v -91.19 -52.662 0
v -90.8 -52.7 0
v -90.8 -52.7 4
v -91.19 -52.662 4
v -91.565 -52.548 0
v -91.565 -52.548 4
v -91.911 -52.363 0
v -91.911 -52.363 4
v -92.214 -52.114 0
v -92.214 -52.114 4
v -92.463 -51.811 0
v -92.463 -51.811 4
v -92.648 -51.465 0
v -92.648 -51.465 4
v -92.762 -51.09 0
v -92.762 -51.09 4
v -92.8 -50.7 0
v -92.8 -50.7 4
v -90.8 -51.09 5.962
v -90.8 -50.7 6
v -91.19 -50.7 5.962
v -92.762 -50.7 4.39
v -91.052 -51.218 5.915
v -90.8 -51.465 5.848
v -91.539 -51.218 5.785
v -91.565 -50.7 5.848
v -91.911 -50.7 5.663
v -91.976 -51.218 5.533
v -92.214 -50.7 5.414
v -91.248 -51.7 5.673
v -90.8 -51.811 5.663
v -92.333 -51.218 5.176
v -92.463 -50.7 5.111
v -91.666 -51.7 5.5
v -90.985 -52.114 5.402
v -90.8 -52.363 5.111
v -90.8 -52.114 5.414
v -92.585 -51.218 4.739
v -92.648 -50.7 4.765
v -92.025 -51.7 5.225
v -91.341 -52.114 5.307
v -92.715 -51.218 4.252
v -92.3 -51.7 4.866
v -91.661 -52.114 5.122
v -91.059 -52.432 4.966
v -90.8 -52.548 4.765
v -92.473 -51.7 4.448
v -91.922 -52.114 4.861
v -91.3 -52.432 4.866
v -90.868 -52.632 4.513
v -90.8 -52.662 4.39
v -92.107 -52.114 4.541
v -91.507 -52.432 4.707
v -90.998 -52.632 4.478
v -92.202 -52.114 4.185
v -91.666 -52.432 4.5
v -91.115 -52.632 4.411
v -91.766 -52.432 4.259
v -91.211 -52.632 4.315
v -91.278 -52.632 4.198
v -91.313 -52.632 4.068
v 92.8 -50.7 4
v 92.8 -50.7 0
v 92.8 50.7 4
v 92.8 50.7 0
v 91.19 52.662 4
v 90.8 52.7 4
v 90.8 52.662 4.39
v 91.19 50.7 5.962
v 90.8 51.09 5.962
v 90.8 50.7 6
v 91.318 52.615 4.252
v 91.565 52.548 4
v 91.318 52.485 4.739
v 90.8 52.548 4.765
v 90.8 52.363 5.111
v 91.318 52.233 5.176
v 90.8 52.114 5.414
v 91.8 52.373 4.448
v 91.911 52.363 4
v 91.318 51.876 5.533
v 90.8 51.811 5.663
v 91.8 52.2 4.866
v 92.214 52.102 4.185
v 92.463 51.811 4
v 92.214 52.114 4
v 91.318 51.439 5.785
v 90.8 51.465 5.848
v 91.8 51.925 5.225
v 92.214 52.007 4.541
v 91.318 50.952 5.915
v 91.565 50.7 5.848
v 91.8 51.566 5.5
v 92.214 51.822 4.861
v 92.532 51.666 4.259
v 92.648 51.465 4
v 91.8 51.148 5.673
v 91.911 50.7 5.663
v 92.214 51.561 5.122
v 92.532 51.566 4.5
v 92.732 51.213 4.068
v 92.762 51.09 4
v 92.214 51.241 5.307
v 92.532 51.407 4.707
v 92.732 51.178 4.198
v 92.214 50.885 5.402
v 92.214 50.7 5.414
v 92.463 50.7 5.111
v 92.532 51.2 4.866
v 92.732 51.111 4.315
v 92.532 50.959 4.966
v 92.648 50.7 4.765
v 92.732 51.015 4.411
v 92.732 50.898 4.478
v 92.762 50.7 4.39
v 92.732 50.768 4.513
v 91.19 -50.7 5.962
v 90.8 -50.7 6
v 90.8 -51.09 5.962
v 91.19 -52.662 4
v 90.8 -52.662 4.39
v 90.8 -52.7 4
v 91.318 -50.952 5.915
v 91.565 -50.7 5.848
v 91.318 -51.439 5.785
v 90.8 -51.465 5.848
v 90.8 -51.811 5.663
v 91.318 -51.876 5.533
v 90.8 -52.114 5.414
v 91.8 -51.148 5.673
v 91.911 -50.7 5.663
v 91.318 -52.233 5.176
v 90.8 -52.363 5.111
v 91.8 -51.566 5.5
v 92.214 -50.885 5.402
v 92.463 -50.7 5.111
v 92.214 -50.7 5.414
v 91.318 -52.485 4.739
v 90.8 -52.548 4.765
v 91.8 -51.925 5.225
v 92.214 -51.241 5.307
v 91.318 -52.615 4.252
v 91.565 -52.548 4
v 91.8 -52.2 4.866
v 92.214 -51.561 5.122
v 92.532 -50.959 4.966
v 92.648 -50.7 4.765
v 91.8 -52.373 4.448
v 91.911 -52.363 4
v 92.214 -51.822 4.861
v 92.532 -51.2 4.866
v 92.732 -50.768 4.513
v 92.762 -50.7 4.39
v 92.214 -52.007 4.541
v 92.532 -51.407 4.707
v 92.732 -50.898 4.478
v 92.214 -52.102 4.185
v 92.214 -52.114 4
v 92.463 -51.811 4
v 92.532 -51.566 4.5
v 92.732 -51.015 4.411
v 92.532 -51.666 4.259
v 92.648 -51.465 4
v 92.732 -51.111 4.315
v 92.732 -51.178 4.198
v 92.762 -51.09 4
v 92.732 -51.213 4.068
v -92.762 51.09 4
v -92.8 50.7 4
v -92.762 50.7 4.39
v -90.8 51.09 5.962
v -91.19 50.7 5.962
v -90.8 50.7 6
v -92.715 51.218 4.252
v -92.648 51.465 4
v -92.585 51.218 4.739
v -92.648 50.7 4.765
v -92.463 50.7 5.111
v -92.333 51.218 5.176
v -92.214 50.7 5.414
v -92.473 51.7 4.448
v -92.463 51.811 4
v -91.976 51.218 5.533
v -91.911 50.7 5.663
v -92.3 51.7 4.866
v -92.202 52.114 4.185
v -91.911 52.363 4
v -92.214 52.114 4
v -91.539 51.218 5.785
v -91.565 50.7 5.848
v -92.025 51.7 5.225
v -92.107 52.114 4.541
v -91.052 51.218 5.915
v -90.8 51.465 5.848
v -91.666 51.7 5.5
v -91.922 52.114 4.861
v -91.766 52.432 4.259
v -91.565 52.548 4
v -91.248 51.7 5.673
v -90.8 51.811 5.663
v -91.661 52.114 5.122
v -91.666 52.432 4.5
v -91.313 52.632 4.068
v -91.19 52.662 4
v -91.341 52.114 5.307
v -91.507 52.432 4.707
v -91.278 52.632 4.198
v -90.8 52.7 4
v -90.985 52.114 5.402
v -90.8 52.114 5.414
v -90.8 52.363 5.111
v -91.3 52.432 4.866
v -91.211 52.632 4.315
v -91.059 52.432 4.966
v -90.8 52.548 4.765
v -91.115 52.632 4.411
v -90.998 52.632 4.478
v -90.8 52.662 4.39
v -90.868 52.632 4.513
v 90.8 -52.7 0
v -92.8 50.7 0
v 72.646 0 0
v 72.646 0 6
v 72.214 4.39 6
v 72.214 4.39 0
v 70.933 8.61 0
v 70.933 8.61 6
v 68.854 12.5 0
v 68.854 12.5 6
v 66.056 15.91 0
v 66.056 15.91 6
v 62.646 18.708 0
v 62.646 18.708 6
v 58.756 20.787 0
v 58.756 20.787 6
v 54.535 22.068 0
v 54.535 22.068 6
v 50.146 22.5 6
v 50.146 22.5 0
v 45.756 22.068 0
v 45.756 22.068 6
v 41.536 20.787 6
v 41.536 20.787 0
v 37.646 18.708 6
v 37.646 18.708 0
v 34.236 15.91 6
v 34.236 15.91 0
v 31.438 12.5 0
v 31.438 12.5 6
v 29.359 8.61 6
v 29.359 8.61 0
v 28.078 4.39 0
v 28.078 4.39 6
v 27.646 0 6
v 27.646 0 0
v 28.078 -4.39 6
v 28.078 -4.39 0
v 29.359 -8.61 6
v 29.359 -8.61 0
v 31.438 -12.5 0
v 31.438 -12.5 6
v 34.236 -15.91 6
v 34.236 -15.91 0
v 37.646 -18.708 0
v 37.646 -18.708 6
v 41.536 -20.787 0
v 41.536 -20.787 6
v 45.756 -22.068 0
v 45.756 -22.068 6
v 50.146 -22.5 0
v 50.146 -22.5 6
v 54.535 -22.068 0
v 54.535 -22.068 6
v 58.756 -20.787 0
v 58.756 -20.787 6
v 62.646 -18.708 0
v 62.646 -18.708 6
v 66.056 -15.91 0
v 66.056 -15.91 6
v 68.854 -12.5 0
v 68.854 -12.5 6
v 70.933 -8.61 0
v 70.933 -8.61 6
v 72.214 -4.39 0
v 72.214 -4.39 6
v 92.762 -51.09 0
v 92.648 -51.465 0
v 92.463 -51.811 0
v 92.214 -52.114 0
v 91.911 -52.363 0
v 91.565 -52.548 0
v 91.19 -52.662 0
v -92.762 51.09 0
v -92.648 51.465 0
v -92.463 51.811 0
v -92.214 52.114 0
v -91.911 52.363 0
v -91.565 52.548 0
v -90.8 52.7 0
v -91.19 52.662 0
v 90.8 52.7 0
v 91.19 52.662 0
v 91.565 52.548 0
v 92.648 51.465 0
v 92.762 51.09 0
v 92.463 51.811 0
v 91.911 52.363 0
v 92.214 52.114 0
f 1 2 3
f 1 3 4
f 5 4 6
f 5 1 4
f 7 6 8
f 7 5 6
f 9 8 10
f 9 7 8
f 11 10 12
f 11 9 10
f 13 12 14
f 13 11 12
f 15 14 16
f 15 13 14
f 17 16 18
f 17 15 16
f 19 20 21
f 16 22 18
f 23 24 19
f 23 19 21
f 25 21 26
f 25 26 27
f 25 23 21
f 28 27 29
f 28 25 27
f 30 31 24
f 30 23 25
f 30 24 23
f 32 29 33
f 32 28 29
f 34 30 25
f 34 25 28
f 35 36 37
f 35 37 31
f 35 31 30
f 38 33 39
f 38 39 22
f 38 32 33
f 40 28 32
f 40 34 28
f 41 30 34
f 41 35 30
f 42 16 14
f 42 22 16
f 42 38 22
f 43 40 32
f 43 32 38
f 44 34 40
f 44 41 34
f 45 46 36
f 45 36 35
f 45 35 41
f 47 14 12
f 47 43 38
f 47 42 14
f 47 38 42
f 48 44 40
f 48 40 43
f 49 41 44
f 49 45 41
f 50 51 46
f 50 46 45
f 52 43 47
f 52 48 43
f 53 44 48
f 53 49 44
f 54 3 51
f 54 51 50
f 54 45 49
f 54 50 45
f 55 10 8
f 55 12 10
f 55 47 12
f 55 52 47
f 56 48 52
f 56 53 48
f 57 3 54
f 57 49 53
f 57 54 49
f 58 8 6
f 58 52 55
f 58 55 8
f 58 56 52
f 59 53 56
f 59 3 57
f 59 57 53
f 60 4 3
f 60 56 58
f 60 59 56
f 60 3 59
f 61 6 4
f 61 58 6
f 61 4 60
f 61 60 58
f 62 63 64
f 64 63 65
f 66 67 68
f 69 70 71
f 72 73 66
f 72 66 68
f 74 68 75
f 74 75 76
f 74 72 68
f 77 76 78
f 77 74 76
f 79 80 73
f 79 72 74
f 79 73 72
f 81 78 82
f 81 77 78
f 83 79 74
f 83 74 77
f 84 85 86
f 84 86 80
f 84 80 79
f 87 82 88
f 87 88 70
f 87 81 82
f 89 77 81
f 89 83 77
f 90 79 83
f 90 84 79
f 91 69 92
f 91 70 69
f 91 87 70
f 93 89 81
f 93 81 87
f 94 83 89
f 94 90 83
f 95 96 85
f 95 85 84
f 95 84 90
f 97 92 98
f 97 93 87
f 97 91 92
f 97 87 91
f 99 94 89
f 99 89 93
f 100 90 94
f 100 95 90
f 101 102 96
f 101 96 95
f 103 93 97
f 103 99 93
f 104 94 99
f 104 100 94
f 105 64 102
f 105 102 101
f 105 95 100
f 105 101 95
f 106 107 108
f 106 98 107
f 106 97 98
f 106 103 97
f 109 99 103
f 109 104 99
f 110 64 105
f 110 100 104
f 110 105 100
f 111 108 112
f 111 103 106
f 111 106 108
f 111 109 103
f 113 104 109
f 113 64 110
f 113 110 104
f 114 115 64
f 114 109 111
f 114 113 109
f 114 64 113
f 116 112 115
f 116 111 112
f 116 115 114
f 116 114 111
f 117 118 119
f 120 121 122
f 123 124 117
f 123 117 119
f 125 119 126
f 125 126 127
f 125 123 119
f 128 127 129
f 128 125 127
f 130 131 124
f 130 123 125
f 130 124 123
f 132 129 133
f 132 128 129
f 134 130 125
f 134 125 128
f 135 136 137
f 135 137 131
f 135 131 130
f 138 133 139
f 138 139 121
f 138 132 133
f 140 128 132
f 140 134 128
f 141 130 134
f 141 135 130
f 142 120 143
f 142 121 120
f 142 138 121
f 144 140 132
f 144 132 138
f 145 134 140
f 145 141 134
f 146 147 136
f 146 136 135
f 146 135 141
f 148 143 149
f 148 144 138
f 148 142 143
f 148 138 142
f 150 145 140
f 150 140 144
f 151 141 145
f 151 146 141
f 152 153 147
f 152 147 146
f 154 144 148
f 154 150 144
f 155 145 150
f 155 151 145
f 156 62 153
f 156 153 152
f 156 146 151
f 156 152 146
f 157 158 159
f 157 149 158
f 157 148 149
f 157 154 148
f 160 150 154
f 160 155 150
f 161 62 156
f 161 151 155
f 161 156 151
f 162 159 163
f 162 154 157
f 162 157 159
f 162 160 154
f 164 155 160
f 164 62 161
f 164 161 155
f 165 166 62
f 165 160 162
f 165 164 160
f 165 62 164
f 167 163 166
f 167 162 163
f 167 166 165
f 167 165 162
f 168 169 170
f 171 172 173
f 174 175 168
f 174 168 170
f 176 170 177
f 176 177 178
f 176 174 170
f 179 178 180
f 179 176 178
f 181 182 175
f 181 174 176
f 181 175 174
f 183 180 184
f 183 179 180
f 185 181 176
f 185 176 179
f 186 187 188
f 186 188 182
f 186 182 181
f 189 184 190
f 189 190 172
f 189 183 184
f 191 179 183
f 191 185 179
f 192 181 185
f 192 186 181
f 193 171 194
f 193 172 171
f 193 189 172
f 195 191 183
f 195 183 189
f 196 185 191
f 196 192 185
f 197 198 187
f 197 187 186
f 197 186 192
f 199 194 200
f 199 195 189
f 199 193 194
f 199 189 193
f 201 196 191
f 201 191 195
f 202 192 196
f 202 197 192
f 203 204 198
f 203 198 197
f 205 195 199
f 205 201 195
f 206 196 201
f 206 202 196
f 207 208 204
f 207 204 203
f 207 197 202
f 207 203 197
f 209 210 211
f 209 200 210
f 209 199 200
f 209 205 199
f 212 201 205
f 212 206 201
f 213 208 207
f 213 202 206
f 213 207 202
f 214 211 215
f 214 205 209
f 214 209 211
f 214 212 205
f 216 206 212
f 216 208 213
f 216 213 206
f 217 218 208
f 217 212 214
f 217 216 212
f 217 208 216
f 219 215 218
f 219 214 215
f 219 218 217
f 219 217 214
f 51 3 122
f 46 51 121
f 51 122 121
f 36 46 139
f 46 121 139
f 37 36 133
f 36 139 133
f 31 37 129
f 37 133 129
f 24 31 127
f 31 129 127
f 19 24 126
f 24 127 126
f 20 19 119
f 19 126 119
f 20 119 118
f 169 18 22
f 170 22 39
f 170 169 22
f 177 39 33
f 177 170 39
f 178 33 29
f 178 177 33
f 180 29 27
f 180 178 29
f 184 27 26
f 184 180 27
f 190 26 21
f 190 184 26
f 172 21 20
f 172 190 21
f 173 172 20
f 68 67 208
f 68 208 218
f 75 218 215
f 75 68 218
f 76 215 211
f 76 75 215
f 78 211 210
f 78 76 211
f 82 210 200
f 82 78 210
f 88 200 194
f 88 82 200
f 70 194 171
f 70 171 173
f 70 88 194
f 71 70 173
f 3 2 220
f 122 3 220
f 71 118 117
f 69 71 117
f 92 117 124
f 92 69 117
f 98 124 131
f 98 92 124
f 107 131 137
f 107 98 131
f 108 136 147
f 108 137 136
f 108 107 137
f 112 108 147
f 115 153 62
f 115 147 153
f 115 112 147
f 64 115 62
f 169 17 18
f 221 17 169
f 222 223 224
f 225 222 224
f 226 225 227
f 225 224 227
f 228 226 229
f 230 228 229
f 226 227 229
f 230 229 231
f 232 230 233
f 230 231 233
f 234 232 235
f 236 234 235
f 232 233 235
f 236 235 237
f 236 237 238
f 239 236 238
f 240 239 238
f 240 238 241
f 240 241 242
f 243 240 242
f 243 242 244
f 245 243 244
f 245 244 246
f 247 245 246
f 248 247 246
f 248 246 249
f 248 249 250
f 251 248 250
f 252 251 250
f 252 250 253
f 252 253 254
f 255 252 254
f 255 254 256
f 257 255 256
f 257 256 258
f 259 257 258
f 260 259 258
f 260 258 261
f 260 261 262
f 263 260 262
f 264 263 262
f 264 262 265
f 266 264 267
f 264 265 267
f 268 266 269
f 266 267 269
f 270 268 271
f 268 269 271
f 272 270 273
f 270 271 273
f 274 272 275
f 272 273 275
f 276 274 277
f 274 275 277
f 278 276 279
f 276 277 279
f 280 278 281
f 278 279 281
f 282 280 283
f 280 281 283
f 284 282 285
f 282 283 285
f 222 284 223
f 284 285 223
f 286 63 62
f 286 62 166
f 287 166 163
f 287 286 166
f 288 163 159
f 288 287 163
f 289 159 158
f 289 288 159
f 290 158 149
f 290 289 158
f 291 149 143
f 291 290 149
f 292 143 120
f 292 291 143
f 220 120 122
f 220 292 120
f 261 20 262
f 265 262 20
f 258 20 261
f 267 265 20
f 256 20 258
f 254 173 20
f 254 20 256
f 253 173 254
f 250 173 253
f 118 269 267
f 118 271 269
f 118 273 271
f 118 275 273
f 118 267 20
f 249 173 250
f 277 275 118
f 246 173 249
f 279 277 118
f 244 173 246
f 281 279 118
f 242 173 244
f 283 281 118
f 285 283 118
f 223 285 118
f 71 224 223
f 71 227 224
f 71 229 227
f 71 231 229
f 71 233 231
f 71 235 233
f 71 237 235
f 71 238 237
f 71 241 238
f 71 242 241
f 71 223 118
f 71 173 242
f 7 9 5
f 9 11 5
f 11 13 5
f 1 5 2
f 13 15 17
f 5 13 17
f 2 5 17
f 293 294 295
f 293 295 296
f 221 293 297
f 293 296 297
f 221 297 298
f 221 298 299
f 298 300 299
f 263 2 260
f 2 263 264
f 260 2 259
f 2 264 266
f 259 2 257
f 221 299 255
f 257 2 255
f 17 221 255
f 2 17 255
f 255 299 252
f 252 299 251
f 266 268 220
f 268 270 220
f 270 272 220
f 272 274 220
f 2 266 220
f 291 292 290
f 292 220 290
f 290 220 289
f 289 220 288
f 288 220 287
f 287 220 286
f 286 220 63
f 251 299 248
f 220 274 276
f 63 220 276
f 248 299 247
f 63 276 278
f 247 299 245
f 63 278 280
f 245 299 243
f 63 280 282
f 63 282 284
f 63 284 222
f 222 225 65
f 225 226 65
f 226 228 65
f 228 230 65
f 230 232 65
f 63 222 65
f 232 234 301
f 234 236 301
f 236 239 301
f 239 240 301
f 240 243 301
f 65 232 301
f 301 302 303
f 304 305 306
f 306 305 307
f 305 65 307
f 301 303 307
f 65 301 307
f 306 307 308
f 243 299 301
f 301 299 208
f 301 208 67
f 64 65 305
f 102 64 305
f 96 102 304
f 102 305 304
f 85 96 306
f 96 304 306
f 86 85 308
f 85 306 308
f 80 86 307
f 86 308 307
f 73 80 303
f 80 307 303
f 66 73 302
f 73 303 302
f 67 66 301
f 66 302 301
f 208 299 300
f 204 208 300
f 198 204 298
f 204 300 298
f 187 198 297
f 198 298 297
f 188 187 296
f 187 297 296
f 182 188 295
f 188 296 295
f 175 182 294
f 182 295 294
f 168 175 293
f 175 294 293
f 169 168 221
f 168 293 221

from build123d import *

# Parameters (mm, degrees)
F0_W         = 185.6
F0_H         = 105.4
F1_DEPTH     = 6
F2_R         = 22.5
F3_DEPTH     = 25
F4_R         = 2
F5_T1_DEPTH  = 9
F5_S5_W      = 2
F5_S5_H      = 2
F5_T6_DEPTH  = 2
F5_S11_W     = 2
F5_S11_H     = 2
F5_T12_DEPTH = 2
F5_S17_W     = 2
F5_S17_H     = 2
F5_T18_DEPTH = 2
F5_S23_W     = 2
F5_S23_H     = 2
F5_T24_DEPTH = 2


# Not quite as in the source:
# - a fillet or chamfer that OpenCascade refuses, or shapes differently, is made with other operations: its cross-section is extruded or revolved along the edge and cut away or added


with BuildPart() as f1:
    # F0 (on Top) → F1 (new body)
    with BuildSketch(Plane.XY):
        Rectangle(F0_W, F0_H)
    extrude(amount=F1_DEPTH)

    # F2 (on face) → F3 (cut)
    with BuildSketch(Plane.XY.offset(6)):
        with Locations((50.1459216796, 0)):
            Circle(F2_R)
    extrude(amount=-F3_DEPTH, mode=Mode.SUBTRACT)

    # F4
    f4_edges = [f1.edges().sort_by_distance(p)[0] for p in [
        (0, -52.7, 6),
        (92.8, 0, 6),
        (0, 52.7, 6),
        (-92.8, 0, 6),
    ]]
    fillet(f4_edges, radius=F4_R)

    # F5: fillet of radius 2 on 4 edges, made by hand

    # F5_s2 → F5_t1 (cut)
    with BuildSketch(Plane.XY.offset(-5)):
        with BuildLine():
            ThreePointArc((92.8, -50.7), (92.2142135624, -52.1142135624), (90.8, -52.7))
            Line((90.8, -52.7), (92.8, -52.7))
            Line((92.8, -52.7), (92.8, -50.7))
        make_face()
        with BuildLine():
            ThreePointArc((92.8, 50.7), (92.2142135624, 52.1142135624), (90.8, 52.7))
            Line((90.8, 52.7), (92.8, 52.7))
            Line((92.8, 52.7), (92.8, 50.7))
        make_face()
        with BuildLine():
            ThreePointArc((-90.8, 52.7), (-92.2142135624, 52.1142135624), (-92.8, 50.7))
            Line((-92.8, 50.7), (-92.8, 52.7))
            Line((-92.8, 52.7), (-90.8, 52.7))
        make_face()
        with BuildLine():
            ThreePointArc((-90.8, -52.7), (-92.2142135624, -52.1142135624), (-92.8, -50.7))
            Line((-92.8, -50.7), (-92.8, -52.7))
            Line((-92.8, -52.7), (-90.8, -52.7))
        make_face()
    extrude(amount=F5_T1_DEPTH, mode=Mode.SUBTRACT)


with BuildPart() as f5_tool4:
    # F5_s5 → F5_t6 (new body)
    with BuildSketch(Plane.XZ.offset(50.7)):
        with Locations((-91.8, 5)):
            Rectangle(F5_S5_W, F5_S5_H)
    extrude(amount=F5_T6_DEPTH)

    # F5_s7 → F5_t8 (revolve, cut)
    with BuildSketch(Plane(origin=(-90.8, -50.7, 4), x_dir=(0.7071067812, 0, -0.7071067812), z_dir=(-0.7071067812, 0, -0.7071067812))):
        with BuildLine():
            ThreePointArc((0, -2), (2, 0), (0, 2))
            Line((0, 2), (0, -2))
        make_face()
    revolve(axis=Axis((-90.8, -50.7, 4), (0, -1, 0)), mode=Mode.SUBTRACT)


with BuildPart() as f1_1:
    add(f1.part)

    # F5_t3: cut F5_tool4
    add(f5_tool4.part, mode=Mode.SUBTRACT)


with BuildPart() as f5_tool10:
    # F5_s11 → F5_t12 (new body)
    with BuildSketch(Plane.XZ.offset(-50.7)):
        with Locations((-91.8, 5)):
            Rectangle(F5_S11_W, F5_S11_H)
    extrude(amount=-F5_T12_DEPTH)

    # F5_s13 → F5_t14 (revolve, cut)
    with BuildSketch(Plane(origin=(-90.8, 50.7, 4), x_dir=(0.7071067812, 0, -0.7071067812), z_dir=(0.7071067812, 0, 0.7071067812))):
        with BuildLine():
            ThreePointArc((0, -2), (2, 0), (0, 2))
            Line((0, 2), (0, -2))
        make_face()
    revolve(axis=Axis((-90.8, 50.7, 4), (0, 1, 0)), mode=Mode.SUBTRACT)


with BuildPart() as f1_2:
    add(f1_1.part)

    # F5_t9: cut F5_tool10
    add(f5_tool10.part, mode=Mode.SUBTRACT)


with BuildPart() as f5_tool16:
    # F5_s17 → F5_t18 (new body)
    with BuildSketch(Plane.YZ.offset(90.8)):
        with Locations((51.7, 5)):
            Rectangle(F5_S17_W, F5_S17_H)
    extrude(amount=F5_T18_DEPTH)

    # F5_s19 → F5_t20 (revolve, cut)
    with BuildSketch(Plane(origin=(90.8, 50.7, 4), x_dir=(0, -0.7071067812, -0.7071067812), z_dir=(0, -0.7071067812, 0.7071067812))):
        with BuildLine():
            ThreePointArc((0, -2), (2, 0), (0, 2))
            Line((0, 2), (0, -2))
        make_face()
    revolve(axis=Axis((90.8, 50.7, 4), (1, 0, 0)), mode=Mode.SUBTRACT)


with BuildPart() as f1_3:
    add(f1_2.part)

    # F5_t15: cut F5_tool16
    add(f5_tool16.part, mode=Mode.SUBTRACT)


with BuildPart() as f5_tool22:
    # F5_s23 → F5_t24 (new body)
    with BuildSketch(Plane.YZ.offset(90.8)):
        with Locations((-51.7, 5)):
            Rectangle(F5_S23_W, F5_S23_H)
    extrude(amount=F5_T24_DEPTH)

    # F5_s25 → F5_t26 (revolve, cut)
    with BuildSketch(Plane(origin=(90.8, -50.7, 4), x_dir=(0, 0.7071067812, -0.7071067812), z_dir=(0, -0.7071067812, -0.7071067812))):
        with BuildLine():
            ThreePointArc((0, -2), (2, 0), (0, 2))
            Line((0, 2), (0, -2))
        make_face()
    revolve(axis=Axis((90.8, -50.7, 4), (1, 0, 0)), mode=Mode.SUBTRACT)


with BuildPart() as f1_4:
    add(f1_3.part)

    # F5_t21: cut F5_tool22
    add(f5_tool22.part, mode=Mode.SUBTRACT)


solid = f1_4.part
